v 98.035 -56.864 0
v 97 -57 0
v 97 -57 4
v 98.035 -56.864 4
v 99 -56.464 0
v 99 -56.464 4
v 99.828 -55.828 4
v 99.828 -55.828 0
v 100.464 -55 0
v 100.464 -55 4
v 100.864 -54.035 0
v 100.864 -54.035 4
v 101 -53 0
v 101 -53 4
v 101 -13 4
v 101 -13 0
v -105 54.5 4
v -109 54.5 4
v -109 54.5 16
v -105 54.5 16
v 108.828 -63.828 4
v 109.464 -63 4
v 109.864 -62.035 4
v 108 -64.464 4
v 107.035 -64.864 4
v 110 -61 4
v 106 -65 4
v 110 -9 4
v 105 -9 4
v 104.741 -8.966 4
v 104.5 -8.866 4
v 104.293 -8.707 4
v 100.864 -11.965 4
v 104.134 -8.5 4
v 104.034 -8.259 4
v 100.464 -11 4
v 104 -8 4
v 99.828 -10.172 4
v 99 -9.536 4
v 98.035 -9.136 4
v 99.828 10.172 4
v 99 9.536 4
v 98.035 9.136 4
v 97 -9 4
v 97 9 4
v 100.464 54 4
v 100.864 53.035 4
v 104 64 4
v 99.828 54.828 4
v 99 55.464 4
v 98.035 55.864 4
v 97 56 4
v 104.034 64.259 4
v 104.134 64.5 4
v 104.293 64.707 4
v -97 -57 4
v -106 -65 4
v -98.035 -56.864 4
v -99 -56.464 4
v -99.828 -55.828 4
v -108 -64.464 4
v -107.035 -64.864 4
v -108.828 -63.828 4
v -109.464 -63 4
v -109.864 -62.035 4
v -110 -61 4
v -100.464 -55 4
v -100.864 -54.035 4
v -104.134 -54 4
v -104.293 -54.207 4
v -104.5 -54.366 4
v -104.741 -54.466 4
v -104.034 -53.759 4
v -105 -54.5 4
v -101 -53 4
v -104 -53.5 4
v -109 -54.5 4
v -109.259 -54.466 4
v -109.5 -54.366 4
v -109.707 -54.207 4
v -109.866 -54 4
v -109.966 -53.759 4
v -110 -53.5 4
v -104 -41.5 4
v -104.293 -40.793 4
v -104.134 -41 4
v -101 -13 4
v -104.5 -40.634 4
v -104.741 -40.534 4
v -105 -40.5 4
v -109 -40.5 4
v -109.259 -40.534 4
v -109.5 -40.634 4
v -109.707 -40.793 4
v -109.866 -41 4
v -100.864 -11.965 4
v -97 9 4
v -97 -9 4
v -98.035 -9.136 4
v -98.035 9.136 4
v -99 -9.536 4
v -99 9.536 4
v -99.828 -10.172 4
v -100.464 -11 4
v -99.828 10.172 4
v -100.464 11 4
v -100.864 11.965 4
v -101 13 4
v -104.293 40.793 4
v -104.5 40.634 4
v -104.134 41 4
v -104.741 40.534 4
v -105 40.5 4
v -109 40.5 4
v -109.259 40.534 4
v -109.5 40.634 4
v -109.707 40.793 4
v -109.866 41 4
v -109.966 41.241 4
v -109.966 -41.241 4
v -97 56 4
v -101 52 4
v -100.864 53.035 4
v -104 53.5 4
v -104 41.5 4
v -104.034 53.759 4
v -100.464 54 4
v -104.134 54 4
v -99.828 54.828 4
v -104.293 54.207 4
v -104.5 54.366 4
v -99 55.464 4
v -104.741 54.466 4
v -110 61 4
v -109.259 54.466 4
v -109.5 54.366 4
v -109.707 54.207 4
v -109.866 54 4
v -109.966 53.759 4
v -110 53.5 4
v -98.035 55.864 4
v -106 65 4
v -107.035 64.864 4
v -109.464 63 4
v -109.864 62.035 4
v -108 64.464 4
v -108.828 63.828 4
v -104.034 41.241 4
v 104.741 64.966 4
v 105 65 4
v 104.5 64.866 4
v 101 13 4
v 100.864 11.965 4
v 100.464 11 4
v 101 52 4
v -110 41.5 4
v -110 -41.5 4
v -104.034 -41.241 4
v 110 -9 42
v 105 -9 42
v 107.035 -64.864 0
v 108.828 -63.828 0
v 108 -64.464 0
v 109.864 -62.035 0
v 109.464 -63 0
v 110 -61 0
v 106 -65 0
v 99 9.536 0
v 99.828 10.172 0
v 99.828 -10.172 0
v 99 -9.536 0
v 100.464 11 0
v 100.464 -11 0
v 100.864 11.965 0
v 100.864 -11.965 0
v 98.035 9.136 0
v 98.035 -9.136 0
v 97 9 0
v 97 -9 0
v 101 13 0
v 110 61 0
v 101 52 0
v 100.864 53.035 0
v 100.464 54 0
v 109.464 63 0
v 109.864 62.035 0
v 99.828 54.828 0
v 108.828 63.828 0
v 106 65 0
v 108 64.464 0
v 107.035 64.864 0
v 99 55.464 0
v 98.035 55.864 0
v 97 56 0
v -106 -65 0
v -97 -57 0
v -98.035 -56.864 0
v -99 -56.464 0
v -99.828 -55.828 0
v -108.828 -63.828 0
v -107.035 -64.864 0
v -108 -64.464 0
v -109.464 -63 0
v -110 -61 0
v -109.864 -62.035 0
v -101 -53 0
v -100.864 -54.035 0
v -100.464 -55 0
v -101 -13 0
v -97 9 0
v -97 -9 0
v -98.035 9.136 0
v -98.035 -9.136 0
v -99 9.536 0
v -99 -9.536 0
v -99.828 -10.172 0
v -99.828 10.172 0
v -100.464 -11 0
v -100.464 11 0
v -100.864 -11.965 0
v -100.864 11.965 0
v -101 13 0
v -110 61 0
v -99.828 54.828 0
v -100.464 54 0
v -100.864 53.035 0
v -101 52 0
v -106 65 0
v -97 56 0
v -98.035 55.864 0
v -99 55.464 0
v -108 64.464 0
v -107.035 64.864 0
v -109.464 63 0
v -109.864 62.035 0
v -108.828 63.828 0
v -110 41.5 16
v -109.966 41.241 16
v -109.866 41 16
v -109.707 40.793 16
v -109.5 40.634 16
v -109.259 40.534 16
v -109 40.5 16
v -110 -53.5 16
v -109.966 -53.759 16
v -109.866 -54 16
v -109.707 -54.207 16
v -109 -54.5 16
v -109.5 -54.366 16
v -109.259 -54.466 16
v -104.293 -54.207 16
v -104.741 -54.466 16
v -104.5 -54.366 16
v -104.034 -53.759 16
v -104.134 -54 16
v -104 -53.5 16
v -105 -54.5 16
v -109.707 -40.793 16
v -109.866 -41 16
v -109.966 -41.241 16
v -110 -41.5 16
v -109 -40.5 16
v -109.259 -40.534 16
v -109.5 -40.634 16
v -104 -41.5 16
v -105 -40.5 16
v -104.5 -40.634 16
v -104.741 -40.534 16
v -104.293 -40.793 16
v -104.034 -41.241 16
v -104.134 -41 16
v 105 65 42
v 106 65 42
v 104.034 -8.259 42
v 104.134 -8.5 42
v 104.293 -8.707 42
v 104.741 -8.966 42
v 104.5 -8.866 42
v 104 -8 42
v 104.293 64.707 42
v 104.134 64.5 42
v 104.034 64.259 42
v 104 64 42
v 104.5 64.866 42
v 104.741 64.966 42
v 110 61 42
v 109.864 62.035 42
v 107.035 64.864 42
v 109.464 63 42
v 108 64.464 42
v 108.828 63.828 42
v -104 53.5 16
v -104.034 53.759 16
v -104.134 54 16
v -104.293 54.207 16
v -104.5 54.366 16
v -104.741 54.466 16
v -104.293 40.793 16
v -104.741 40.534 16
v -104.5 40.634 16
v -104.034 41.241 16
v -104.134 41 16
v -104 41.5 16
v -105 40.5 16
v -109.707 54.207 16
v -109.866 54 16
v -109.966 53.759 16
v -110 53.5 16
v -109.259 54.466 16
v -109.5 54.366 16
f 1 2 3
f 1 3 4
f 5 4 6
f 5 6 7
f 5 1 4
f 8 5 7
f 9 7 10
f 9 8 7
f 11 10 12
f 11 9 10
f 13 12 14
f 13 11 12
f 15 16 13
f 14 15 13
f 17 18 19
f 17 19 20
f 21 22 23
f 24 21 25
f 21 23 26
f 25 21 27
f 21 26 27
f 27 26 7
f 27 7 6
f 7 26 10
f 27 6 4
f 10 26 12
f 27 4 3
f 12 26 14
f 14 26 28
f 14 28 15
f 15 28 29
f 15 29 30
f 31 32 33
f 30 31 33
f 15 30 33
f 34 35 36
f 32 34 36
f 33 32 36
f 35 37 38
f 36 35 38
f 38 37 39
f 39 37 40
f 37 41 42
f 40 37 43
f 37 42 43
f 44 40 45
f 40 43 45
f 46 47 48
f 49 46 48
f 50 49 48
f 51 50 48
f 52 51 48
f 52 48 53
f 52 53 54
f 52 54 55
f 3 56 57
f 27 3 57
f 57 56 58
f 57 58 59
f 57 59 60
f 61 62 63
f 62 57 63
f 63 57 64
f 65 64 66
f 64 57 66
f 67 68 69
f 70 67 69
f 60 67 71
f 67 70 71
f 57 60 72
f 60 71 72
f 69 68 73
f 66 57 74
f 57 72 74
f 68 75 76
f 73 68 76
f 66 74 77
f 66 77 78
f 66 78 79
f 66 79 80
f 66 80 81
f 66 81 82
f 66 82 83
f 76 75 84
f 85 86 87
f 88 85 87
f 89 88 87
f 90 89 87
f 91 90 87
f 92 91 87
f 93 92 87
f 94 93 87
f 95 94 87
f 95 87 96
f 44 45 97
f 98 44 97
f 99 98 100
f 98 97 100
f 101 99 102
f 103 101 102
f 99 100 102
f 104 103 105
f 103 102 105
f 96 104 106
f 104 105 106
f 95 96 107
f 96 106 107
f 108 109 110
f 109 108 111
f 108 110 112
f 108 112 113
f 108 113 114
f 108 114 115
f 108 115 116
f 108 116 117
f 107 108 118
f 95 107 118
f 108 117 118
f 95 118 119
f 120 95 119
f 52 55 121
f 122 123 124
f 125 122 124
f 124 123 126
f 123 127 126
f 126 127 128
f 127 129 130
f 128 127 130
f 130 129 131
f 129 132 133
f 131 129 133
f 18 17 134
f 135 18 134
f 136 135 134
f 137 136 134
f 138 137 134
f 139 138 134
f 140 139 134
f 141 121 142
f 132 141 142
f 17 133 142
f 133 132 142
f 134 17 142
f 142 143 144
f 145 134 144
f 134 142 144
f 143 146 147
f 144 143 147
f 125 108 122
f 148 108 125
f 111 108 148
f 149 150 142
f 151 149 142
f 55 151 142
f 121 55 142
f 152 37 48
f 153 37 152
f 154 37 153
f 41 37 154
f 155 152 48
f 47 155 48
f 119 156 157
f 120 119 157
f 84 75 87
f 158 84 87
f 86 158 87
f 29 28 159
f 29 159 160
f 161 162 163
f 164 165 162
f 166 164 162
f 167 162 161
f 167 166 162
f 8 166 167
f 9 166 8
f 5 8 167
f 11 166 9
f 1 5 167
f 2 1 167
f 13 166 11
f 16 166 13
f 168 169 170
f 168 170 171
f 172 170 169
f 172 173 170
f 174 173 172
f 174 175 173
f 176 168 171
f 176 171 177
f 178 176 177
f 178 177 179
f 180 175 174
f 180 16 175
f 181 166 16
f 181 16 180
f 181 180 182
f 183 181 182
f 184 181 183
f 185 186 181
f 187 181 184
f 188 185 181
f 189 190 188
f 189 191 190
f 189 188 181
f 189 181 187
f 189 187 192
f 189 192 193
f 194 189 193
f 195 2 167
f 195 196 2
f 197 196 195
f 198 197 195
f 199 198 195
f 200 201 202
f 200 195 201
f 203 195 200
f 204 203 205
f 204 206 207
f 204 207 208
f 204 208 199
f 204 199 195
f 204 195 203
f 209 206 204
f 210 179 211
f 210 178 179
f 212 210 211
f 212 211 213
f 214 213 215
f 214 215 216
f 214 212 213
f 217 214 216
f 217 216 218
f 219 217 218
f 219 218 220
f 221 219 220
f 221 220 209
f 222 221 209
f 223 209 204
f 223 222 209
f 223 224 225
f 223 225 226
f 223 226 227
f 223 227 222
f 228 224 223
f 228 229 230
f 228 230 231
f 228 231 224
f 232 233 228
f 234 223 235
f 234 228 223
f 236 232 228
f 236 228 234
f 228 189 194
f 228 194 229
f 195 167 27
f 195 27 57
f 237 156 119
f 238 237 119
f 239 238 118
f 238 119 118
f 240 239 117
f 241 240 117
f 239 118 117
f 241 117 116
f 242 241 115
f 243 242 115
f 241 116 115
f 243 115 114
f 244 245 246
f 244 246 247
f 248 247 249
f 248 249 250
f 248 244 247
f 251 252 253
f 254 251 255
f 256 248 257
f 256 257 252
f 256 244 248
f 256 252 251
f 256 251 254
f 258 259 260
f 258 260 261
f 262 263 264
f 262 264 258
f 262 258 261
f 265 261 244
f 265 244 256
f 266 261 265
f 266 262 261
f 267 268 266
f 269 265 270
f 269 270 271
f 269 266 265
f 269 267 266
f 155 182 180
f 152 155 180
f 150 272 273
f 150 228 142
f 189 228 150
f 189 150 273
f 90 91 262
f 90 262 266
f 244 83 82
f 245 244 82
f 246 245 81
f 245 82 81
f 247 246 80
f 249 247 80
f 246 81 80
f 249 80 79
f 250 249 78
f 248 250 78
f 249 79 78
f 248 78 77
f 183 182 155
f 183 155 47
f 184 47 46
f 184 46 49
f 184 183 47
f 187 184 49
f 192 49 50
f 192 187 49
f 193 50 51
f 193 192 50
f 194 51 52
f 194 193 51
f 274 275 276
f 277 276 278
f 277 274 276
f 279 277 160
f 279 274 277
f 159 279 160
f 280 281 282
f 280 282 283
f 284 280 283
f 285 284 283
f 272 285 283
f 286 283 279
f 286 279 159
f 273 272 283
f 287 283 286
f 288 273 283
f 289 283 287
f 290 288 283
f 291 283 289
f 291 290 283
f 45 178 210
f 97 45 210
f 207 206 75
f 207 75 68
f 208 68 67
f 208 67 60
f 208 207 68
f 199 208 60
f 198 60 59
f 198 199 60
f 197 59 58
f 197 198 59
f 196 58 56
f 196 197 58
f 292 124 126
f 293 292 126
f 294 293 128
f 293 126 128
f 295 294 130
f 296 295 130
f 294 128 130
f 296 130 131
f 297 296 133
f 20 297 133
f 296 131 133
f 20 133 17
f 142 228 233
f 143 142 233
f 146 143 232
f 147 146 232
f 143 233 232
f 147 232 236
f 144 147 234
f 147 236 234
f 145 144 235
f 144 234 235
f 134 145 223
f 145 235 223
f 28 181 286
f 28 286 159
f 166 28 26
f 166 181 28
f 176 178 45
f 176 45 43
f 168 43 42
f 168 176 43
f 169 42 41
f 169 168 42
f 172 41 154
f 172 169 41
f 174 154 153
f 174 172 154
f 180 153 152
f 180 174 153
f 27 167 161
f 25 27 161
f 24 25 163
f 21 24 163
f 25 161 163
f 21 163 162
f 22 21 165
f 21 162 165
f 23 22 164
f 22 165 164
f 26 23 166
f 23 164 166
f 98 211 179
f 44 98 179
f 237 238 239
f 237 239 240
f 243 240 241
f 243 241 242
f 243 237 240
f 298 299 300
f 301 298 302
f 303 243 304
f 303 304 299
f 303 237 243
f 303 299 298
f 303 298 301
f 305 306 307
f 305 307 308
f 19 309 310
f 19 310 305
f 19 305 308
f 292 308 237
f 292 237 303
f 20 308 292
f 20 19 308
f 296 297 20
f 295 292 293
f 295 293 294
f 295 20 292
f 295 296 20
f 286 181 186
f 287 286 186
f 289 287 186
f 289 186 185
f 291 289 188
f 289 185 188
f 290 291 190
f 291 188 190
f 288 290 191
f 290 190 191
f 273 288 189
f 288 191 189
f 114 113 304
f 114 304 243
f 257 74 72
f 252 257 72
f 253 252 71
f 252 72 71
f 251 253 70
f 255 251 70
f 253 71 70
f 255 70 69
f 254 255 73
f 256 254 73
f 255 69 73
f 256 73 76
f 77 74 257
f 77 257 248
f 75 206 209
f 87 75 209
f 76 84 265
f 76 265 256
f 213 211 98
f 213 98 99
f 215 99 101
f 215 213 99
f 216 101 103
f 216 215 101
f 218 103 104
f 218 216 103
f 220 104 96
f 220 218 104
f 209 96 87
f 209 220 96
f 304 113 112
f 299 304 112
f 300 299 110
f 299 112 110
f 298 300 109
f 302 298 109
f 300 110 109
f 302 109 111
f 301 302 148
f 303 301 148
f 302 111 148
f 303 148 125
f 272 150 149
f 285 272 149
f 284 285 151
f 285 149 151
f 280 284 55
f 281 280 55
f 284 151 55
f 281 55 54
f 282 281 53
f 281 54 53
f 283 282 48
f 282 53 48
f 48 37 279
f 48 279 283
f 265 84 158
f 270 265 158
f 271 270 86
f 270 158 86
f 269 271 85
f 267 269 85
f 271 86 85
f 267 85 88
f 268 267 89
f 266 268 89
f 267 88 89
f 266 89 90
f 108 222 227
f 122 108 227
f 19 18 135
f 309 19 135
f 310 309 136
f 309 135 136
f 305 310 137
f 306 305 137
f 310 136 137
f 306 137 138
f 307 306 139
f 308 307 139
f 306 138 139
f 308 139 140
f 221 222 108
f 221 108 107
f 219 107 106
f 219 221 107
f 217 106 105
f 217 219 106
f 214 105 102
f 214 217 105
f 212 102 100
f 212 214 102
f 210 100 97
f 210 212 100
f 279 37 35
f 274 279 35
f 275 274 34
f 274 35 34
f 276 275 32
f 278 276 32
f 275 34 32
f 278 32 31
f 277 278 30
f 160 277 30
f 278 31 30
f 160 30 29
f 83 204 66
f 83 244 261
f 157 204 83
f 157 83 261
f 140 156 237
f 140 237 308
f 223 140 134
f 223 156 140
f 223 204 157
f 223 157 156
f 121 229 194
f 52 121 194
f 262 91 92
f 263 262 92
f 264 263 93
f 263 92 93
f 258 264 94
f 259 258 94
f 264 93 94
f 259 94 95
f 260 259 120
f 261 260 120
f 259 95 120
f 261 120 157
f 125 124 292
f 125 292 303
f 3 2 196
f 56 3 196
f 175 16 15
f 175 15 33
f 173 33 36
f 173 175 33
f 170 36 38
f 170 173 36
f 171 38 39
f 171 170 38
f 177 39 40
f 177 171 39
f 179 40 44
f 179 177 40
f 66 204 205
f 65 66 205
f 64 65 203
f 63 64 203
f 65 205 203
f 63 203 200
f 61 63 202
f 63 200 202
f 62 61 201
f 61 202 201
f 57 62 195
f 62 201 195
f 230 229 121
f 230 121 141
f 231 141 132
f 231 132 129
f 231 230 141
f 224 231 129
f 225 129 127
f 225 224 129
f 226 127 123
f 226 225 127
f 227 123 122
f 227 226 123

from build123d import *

# Parameters (mm, degrees)
PAD_DEPTH       = 4
PAD001_DEPTH    = 38
PAD002_DEPTH    = 12
SKETCH009_R     = 1.4
POCKET001_DEPTH = 8


with BuildPart() as part:
    # Sketch → Pad (new body)
    with BuildSketch(Plane.XY):
        with BuildLine():
            Line((-106, 65), (106, 65))
            ThreePointArc((110, 61), (108.828427, 63.828427), (106, 65))
            Line((110, 61), (110, -61))
            ThreePointArc((106, -65), (108.828427, -63.828427), (110, -61))
            Line((106, -65), (-106, -65))
            ThreePointArc((-110, -61), (-108.828427, -63.828427), (-106, -65))
            Line((-110, -61), (-110, 61))
            ThreePointArc((-106, 65), (-108.828427, 63.828427), (-110, 61))
        make_face()
        with BuildLine():
            ThreePointArc((-97, -9), (-99.828427, -10.171573), (-101, -13))
            Line((-101, -53), (-101, -13))
            ThreePointArc((-101, -53), (-99.828427, -55.828427), (-97, -57))
            Line((97, -57), (-97, -57))
            ThreePointArc((97, -57), (99.828427, -55.828427), (101, -53))
            Line((101, -13), (101, -53))
            ThreePointArc((101, -13), (99.828427, -10.171573), (97, -9))
            Line((-97, -9), (97, -9))
        make_face(mode=Mode.SUBTRACT)
        with BuildLine():
            ThreePointArc((-97, 56), (-99.828427, 54.828427), (-101, 52))
            Line((-101, 13), (-101, 52))
            ThreePointArc((-101, 13), (-99.828427, 10.171573), (-97, 9))
            Line((97, 9), (-97, 9))
            ThreePointArc((97, 9), (99.828427, 10.171573), (101, 13))
            Line((101, 52), (101, 13))
            ThreePointArc((101, 52), (99.828427, 54.828427), (97, 56))
            Line((-97, 56), (97, 56))
        make_face(mode=Mode.SUBTRACT)
    extrude(amount=PAD_DEPTH)

    # Sketch006 (on Face26 of Pad) → Pad001 (join)
    with BuildSketch(Plane.XY.offset(4)):
        with BuildLine():
            ThreePointArc((105, 65), (104.292893, 64.707107), (104, 64))
            Line((104, -8), (104, 64))
            ThreePointArc((104, -8), (104.292893, -8.707107), (105, -9))
            Line((110, -9), (105, -9))
            Line((110, 61), (110, -9))
            ThreePointArc((110, 61), (108.828427, 63.828427), (106, 65))
            Line((105, 65), (106, 65))
        make_face()
    extrude(amount=PAD001_DEPTH)

    # Sketch008 → Pad002 (join)
    with BuildSketch(Plane.XY.offset(4)):
        with BuildLine():
            ThreePointArc((-109, 54.5), (-109.707107, 54.207107), (-110, 53.5))
            Line((-110, 41.5), (-110, 53.5))
            ThreePointArc((-110, 41.5), (-109.707107, 40.792893), (-109, 40.5))
            Line((-105, 40.5), (-109, 40.5))
            ThreePointArc((-105, 40.5), (-104.292893, 40.792893), (-104, 41.5))
            Line((-104, 53.5), (-104, 41.5))
            ThreePointArc((-104, 53.5), (-104.292893, 54.207107), (-105, 54.5))
            Line((-109, 54.5), (-105, 54.5))
        make_face()
        with BuildLine():
            ThreePointArc((-109, -40.5), (-109.707107, -40.792893), (-110, -41.5))
            Line((-110, -53.5), (-110, -41.5))
            ThreePointArc((-110, -53.5), (-109.707107, -54.207107), (-109, -54.5))
            Line((-105, -54.5), (-109, -54.5))
            ThreePointArc((-105, -54.5), (-104.292893, -54.207107), (-104, -53.5))
            Line((-104, -41.5), (-104, -53.5))
            ThreePointArc((-104, -41.5), (-104.292893, -40.792893), (-105, -40.5))
            Line((-109, -40.5), (-105, -40.5))
        make_face()
    extrude(amount=PAD002_DEPTH)

    # Sketch009 (on Face7 of Pad002) → Pocket001 (cut)
    with BuildSketch(Plane(origin=(-110, 0, 0), x_dir=(0, -1, 0), z_dir=(-1, 0, 0))):
        with Locations((2, 9)):
            Circle(SKETCH009_R)
        with Locations((97, 9)):
            Circle(SKETCH009_R)
    extrude(amount=-POCKET001_DEPTH, mode=Mode.SUBTRACT)


solid = part.part
